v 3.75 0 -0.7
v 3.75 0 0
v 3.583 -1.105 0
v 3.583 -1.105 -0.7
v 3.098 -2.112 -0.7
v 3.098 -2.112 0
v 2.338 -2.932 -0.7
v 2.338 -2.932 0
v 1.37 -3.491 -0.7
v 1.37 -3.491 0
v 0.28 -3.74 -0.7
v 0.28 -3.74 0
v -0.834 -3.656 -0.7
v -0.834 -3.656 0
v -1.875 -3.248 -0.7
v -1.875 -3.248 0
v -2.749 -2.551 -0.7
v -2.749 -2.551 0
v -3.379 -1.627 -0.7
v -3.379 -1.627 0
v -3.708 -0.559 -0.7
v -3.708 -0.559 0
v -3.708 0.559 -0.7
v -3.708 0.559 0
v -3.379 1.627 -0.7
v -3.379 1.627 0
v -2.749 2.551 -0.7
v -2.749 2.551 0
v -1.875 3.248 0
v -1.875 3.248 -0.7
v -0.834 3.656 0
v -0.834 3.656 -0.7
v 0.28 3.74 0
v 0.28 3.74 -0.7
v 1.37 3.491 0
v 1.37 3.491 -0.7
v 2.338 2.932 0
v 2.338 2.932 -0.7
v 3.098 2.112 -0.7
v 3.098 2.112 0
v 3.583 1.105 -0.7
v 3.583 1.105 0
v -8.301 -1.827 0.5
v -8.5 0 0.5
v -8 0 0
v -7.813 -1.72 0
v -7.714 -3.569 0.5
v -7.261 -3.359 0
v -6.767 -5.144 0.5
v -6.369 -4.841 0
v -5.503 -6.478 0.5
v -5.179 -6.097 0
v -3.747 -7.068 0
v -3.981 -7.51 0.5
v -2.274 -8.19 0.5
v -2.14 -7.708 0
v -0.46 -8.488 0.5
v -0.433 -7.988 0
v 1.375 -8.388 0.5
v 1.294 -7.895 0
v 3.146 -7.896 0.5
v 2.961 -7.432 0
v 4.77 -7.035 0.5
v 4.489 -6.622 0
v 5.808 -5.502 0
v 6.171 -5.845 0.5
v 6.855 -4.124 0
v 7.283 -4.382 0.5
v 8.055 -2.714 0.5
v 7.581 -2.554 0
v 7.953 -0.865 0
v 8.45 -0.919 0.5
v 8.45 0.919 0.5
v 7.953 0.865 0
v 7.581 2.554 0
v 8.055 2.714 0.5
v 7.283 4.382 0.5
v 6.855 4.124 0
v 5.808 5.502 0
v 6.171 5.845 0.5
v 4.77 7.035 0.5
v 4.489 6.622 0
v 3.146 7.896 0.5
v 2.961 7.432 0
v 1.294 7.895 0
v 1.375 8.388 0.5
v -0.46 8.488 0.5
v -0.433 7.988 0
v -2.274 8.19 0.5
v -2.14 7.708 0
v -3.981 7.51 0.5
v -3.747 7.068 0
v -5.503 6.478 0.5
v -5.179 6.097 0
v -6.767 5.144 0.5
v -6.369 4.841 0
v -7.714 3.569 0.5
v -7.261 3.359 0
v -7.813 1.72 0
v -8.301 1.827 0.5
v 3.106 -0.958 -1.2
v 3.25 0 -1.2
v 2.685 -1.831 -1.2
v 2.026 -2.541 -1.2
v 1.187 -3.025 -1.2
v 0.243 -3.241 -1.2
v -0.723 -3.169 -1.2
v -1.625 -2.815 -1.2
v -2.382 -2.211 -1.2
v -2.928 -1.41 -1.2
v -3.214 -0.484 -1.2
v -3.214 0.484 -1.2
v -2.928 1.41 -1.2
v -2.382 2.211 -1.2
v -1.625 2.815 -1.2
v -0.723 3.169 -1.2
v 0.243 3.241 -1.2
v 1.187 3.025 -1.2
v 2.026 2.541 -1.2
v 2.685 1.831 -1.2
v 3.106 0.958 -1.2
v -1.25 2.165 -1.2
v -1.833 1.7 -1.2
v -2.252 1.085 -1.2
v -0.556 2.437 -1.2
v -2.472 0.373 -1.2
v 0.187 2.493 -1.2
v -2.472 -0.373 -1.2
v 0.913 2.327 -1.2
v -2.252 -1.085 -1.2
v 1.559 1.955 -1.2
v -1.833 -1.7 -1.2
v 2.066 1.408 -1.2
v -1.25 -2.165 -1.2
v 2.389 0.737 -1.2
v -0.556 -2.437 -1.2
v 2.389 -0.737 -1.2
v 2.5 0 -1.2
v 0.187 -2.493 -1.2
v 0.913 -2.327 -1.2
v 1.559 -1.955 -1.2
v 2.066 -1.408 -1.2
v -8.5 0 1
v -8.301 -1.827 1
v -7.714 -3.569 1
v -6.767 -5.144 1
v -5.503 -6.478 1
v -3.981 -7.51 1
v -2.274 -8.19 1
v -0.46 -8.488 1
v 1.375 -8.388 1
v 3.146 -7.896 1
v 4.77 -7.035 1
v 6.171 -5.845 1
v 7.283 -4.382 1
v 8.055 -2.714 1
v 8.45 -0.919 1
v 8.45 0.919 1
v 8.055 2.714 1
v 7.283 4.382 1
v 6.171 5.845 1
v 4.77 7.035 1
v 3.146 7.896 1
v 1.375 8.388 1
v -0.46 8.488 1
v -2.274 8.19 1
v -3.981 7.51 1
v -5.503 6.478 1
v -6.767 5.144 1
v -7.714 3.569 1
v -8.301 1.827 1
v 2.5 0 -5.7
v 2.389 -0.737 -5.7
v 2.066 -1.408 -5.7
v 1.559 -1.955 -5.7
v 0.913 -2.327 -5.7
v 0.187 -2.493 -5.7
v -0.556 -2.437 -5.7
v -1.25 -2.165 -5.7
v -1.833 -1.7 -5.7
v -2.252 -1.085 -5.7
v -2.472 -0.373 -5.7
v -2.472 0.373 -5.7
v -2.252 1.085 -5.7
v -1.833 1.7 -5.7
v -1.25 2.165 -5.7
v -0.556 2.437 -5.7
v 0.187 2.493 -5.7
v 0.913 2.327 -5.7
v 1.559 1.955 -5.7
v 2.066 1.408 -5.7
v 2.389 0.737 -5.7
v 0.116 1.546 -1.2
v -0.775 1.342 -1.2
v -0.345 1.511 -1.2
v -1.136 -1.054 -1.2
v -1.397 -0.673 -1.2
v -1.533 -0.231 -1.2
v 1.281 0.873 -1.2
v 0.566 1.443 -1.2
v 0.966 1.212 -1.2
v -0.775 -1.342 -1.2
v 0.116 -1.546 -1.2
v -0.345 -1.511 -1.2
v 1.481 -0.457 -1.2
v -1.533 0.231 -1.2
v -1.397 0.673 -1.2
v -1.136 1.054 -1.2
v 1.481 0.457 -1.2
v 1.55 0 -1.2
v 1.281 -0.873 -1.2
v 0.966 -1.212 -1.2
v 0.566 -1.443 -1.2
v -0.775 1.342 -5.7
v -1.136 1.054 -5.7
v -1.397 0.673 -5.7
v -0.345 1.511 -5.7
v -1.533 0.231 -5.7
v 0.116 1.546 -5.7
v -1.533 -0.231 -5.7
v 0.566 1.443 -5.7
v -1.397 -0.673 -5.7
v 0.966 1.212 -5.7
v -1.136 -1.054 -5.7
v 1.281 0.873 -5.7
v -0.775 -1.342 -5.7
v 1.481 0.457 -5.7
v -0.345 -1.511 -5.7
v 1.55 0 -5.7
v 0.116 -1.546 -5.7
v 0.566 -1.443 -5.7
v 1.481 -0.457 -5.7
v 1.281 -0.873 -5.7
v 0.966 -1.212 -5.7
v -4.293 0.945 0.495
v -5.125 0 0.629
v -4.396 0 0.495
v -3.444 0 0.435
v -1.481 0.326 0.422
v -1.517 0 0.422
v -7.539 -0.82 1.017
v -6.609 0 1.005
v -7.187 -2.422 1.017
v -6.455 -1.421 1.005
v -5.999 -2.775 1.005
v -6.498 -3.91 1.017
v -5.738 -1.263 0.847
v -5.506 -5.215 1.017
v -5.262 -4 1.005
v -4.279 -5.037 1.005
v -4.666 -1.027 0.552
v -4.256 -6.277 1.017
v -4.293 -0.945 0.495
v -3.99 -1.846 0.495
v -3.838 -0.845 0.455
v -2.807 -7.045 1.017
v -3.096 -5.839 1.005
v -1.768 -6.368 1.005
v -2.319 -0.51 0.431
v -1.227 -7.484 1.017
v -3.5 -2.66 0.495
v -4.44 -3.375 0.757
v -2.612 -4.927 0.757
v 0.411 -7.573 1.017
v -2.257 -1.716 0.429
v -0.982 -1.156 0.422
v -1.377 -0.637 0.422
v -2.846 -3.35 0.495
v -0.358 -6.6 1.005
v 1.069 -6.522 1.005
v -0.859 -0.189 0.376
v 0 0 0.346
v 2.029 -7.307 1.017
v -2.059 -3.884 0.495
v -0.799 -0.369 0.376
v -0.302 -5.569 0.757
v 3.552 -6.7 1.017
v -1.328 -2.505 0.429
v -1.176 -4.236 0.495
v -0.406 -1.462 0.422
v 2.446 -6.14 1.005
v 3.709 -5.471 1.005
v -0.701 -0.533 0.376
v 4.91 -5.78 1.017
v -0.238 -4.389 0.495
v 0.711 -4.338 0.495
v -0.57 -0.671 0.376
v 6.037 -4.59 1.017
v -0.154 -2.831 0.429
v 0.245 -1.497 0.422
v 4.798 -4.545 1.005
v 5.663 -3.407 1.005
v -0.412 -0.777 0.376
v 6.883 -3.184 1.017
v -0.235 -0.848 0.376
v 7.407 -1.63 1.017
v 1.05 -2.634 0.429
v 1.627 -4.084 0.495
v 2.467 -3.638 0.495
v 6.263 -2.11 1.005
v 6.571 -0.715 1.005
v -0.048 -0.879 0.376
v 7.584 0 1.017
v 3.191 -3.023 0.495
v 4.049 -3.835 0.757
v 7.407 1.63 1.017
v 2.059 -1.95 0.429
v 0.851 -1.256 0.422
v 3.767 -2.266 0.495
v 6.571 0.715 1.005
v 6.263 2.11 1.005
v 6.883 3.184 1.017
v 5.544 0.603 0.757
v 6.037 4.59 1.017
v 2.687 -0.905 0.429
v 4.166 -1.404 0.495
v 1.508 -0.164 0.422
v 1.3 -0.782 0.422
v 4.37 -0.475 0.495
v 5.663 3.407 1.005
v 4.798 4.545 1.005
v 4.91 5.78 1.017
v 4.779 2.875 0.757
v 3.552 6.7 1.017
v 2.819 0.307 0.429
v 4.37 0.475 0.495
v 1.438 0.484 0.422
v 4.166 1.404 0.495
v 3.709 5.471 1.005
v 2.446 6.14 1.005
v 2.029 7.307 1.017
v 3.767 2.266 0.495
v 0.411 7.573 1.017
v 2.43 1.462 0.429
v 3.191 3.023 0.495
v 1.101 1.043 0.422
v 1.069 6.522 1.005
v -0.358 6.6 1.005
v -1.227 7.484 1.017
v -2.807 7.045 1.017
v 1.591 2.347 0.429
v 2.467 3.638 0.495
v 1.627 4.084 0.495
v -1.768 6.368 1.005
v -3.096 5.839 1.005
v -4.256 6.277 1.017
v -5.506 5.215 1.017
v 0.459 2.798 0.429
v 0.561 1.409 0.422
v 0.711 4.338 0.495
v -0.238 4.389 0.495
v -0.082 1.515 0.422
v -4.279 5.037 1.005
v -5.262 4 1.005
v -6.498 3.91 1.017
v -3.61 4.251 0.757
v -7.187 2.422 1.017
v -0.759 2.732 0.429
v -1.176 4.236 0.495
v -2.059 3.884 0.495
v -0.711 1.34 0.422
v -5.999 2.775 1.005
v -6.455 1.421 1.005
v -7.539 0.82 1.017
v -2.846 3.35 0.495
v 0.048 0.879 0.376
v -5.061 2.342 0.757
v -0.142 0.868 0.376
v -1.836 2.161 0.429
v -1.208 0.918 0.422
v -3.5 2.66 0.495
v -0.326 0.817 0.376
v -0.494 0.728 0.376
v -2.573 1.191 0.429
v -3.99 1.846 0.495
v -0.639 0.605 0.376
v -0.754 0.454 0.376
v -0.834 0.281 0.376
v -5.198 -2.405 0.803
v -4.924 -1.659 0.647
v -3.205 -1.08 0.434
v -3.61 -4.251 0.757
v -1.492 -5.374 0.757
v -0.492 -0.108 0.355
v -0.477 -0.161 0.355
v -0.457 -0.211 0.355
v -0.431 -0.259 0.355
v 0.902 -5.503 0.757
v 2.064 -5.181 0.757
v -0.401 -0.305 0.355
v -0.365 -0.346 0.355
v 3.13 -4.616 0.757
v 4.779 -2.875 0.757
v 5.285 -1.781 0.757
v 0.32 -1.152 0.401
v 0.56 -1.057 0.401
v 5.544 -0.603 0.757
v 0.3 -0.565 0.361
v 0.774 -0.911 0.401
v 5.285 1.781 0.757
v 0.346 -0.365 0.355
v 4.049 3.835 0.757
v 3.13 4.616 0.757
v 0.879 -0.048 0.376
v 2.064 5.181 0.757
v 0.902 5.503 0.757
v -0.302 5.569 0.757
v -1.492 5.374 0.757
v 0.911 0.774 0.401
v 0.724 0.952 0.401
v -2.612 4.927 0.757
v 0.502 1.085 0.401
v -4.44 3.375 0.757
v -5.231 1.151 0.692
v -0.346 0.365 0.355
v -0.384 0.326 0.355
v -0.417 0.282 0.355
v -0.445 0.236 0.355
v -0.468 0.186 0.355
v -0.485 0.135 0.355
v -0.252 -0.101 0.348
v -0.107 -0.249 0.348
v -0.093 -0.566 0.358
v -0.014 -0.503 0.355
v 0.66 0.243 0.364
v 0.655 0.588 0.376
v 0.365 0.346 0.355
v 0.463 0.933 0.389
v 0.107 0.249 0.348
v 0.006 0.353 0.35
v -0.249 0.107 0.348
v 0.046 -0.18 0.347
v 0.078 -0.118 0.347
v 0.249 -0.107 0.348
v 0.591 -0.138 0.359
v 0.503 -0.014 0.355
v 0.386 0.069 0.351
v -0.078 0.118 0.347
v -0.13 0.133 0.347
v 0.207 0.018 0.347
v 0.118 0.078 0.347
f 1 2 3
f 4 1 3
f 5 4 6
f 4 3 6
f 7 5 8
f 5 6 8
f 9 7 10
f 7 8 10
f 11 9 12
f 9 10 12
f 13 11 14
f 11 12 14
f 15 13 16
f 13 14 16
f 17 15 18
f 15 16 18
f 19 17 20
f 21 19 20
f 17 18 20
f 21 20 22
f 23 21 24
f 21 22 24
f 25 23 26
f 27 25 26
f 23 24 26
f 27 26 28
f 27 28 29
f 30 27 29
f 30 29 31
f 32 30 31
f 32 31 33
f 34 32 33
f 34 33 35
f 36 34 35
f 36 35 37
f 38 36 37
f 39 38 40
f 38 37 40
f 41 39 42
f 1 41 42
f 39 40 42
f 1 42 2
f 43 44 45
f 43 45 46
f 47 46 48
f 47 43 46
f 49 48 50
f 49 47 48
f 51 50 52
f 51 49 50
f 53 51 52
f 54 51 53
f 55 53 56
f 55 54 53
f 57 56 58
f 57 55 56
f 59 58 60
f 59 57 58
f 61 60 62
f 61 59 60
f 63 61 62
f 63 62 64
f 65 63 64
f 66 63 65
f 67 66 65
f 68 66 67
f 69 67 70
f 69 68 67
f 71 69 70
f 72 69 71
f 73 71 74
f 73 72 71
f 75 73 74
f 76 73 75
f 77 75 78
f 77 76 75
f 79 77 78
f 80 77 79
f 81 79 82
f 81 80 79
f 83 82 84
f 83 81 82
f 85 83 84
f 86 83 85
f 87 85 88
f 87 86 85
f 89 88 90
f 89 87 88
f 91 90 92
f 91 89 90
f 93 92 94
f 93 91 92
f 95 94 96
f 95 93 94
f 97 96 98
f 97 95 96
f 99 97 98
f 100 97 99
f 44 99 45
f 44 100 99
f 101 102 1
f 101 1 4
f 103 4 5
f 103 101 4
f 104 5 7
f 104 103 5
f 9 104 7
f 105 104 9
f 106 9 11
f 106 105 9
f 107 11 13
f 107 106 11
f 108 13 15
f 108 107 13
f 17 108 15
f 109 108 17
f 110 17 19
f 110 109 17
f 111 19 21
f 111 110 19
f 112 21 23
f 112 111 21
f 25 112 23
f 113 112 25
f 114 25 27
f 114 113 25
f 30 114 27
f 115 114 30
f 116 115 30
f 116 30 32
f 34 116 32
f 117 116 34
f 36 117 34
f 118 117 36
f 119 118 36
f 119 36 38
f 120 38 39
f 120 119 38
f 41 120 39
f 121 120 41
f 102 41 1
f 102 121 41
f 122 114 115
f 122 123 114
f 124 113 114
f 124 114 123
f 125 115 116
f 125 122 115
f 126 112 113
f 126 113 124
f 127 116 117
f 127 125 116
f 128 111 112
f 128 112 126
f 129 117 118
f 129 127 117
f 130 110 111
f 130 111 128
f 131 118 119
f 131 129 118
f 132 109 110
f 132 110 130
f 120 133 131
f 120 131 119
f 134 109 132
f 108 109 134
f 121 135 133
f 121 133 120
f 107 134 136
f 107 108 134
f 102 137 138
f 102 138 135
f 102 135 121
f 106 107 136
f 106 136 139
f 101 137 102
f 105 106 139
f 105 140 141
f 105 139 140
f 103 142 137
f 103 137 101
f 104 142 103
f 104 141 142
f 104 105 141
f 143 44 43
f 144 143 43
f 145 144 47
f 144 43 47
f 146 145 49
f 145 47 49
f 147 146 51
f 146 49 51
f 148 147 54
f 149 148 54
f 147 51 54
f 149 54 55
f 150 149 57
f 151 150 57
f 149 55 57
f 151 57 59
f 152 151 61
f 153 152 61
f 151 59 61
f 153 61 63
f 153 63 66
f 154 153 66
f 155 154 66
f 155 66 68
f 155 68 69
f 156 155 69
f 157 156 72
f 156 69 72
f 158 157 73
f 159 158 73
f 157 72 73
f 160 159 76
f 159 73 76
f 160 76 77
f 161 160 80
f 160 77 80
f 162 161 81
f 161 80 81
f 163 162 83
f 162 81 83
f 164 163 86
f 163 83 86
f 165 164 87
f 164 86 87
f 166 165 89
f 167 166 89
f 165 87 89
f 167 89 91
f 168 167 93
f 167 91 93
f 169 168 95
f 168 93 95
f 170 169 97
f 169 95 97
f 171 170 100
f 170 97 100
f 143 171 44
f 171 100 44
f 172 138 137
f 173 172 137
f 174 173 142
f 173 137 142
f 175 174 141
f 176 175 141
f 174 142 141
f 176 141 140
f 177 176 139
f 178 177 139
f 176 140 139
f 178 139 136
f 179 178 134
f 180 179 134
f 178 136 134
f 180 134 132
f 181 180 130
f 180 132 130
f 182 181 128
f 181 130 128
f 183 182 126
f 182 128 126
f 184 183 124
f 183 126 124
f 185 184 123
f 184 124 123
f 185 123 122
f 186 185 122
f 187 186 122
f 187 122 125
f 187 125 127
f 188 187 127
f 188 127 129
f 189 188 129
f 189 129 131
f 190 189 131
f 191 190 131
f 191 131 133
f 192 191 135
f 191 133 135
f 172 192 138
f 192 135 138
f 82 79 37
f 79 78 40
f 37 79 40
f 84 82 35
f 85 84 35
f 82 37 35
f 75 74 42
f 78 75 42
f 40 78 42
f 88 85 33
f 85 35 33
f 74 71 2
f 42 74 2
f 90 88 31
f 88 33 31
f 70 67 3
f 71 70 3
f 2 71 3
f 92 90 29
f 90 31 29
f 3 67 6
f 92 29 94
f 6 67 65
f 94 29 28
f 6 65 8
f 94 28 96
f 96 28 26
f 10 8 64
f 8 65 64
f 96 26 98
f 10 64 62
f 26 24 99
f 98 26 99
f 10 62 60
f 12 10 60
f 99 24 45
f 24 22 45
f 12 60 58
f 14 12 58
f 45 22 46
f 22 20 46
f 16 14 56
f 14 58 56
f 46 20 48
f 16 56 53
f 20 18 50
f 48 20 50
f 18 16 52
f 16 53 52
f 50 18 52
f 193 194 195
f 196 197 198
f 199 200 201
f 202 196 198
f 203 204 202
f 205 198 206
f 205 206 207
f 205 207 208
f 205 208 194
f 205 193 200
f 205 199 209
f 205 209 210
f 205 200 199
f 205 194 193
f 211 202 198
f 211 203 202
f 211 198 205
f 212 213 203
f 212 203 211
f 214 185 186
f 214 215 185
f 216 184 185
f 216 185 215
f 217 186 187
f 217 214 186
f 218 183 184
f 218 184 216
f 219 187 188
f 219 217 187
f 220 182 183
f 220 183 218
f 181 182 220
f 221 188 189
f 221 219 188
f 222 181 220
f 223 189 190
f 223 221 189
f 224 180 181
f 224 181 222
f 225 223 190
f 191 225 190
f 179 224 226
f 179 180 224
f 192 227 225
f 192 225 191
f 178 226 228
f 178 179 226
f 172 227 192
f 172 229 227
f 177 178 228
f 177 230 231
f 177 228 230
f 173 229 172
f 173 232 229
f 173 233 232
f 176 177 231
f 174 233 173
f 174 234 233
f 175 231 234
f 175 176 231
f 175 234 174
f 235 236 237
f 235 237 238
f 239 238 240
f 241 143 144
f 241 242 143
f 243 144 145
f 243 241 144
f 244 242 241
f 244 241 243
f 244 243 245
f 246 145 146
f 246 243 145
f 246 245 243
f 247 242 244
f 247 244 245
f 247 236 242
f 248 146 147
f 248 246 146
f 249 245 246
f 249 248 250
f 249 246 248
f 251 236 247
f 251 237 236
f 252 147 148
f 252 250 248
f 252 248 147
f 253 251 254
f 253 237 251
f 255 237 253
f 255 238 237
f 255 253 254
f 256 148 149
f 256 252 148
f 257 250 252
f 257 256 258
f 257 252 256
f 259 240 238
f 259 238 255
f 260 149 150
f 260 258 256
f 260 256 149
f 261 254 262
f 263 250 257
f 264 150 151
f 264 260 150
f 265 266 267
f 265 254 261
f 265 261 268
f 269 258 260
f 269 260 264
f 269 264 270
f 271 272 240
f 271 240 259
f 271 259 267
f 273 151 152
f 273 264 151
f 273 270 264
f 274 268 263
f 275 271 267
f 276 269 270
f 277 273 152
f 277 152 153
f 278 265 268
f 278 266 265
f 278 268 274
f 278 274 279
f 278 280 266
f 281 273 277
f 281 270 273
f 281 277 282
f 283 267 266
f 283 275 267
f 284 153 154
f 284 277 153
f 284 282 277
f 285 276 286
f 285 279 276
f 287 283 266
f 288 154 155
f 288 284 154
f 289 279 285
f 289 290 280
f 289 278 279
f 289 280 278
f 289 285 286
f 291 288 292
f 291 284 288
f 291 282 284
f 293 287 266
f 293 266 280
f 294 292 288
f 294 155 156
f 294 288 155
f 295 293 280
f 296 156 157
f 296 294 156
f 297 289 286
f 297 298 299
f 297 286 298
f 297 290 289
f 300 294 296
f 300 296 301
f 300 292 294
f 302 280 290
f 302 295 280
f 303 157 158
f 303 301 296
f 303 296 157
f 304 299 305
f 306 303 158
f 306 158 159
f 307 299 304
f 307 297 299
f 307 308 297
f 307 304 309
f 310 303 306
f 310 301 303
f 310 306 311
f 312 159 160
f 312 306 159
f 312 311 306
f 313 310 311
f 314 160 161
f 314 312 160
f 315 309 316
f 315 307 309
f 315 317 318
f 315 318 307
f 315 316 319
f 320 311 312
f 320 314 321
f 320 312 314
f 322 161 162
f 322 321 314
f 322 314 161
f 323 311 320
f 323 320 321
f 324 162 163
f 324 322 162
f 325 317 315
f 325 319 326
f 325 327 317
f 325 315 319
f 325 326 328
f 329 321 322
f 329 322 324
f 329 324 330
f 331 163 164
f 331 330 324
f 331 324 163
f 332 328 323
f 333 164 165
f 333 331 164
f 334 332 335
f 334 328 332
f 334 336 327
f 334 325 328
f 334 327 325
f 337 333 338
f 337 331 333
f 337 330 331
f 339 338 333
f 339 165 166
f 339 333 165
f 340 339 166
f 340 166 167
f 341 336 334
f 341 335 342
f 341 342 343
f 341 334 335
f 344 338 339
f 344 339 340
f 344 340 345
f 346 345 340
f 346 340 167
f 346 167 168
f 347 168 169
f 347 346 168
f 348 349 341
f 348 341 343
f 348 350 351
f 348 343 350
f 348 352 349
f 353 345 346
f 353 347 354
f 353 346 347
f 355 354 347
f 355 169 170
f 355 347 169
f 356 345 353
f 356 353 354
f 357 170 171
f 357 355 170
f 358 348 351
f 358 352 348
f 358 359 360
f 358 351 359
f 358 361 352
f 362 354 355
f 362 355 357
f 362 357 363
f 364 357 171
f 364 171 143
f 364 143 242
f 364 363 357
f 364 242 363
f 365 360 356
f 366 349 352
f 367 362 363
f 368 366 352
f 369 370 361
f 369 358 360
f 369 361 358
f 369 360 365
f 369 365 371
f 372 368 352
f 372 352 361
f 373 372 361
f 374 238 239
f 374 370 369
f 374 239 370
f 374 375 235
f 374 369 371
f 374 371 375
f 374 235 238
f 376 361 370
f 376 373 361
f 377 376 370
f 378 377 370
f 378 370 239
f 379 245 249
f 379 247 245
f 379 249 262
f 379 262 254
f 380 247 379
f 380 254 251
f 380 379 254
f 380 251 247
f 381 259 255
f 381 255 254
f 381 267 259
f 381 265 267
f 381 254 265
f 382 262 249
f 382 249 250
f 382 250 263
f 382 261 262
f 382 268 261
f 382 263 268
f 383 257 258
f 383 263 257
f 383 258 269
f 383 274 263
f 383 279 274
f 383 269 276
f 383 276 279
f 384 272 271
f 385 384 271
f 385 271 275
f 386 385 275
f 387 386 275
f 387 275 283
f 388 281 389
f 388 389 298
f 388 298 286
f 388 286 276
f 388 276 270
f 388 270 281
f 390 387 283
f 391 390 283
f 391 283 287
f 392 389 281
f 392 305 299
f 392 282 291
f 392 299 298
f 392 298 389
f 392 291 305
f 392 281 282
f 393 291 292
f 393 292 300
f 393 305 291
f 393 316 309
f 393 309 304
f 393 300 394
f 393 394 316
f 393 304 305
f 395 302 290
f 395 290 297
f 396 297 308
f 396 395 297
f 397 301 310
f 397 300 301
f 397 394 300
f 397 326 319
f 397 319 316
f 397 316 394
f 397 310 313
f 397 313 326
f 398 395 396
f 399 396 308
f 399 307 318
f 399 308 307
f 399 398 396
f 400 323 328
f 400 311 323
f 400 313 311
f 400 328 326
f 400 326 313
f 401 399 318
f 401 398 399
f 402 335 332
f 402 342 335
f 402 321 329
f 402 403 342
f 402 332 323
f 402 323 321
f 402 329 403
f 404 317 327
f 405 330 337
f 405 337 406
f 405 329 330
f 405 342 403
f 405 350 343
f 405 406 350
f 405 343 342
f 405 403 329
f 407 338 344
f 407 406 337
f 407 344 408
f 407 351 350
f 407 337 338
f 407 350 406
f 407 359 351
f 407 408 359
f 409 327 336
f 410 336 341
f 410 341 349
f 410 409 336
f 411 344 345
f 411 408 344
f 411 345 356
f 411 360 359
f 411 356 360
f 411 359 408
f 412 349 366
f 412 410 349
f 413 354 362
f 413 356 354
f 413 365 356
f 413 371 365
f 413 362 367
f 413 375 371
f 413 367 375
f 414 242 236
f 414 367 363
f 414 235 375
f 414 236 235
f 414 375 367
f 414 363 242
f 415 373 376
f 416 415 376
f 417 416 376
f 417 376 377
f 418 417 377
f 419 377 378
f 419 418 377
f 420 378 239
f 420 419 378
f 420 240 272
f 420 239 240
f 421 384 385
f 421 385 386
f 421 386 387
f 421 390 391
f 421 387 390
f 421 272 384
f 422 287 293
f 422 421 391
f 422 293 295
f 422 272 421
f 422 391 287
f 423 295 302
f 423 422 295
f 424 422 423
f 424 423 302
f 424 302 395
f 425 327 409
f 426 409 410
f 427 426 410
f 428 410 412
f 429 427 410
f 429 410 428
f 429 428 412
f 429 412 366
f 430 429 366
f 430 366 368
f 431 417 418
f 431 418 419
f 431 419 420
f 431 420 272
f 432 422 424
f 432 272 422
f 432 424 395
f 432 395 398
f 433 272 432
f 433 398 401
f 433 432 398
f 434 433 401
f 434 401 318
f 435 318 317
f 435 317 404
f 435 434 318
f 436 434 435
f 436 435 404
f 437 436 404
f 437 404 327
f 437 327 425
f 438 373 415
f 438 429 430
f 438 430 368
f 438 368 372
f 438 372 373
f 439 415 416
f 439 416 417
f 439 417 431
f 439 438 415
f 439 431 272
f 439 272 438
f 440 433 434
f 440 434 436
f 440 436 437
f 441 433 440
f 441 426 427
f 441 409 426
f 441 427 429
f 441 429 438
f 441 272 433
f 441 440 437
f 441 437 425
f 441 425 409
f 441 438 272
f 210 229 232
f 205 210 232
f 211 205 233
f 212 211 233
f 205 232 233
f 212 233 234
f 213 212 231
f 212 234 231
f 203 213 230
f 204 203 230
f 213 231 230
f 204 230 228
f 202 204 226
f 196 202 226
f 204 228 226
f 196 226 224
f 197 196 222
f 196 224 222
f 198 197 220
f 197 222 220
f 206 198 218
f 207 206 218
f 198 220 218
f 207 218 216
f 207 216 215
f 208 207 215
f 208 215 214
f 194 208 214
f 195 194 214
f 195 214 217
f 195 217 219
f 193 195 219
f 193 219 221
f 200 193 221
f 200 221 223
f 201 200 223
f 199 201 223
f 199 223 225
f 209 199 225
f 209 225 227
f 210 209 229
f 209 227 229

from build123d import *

# Parameters (mm, degrees)
F2_R     = 3.75
F3_DEPTH = 1.2
F4_R     = 2.5
F5_DEPTH = 4.5
F6_R     = 1.55
F7_DEPTH = 4.5
F8_SIZE2 = 0.5
F8_SIZE  = 0.5


with BuildPart() as f1:
    # F0 (on Front) → F1 (revolve)
    with BuildSketch(Plane.XZ):
        with BuildLine():
            Line((-8.5, 0), (0, 0))
            Line((0, 0), (0, 0.346079265))
            add(Edge.make_bspline(
                [(-8.5, 1), (-7.9439580441, 0.9699382936), (-6.4414965177, 1.1872948826), (-4.7760567404, 0.3213823797), (-1.4301329999, 0.5005030041), (-0.8624908504, 0.3459224587), (0, 0.346079265)],
                knots=[0, 0, 0, 0, 0.2391975808, 0.4806677273, 0.7782536308, 1, 1, 1, 1], degree=3))
            Line((-8.5, 1), (-8.5, 0))
        make_face()
    revolve(axis=Axis((0, 0, 0.599608873), (0, 0, 1)))

    # F2 (on face) → F3 (join)
    with BuildSketch(Plane(origin=(0, 0, 0), x_dir=(1, 0, 0), z_dir=(0, 0, -1))):
        Circle(F2_R)
    extrude(amount=F3_DEPTH)

    # F4 (on face) → F5 (join)
    with BuildSketch(Plane(origin=(0, 0, -1.2), x_dir=(1, 0, 0), z_dir=(0, 0, -1))):
        Circle(F4_R)
    extrude(amount=F5_DEPTH)

    # F6 (on face) → F7 (cut, through all)
    with BuildSketch(Plane(origin=(0, 0, -5.7), x_dir=(1, 0, 0), z_dir=(0, 0, -1))):
        Circle(F6_R)
    extrude(amount=-F7_DEPTH, mode=Mode.SUBTRACT)

    # F8
    f8_edges = [f1.edges().sort_by_distance(p)[0] for p in [
        (-3.75, 0, -1.2),
        (8.5, 0, 0),
    ]]
    chamfer(f8_edges, length=F8_SIZE, length2=F8_SIZE2)


solid = f1.part
